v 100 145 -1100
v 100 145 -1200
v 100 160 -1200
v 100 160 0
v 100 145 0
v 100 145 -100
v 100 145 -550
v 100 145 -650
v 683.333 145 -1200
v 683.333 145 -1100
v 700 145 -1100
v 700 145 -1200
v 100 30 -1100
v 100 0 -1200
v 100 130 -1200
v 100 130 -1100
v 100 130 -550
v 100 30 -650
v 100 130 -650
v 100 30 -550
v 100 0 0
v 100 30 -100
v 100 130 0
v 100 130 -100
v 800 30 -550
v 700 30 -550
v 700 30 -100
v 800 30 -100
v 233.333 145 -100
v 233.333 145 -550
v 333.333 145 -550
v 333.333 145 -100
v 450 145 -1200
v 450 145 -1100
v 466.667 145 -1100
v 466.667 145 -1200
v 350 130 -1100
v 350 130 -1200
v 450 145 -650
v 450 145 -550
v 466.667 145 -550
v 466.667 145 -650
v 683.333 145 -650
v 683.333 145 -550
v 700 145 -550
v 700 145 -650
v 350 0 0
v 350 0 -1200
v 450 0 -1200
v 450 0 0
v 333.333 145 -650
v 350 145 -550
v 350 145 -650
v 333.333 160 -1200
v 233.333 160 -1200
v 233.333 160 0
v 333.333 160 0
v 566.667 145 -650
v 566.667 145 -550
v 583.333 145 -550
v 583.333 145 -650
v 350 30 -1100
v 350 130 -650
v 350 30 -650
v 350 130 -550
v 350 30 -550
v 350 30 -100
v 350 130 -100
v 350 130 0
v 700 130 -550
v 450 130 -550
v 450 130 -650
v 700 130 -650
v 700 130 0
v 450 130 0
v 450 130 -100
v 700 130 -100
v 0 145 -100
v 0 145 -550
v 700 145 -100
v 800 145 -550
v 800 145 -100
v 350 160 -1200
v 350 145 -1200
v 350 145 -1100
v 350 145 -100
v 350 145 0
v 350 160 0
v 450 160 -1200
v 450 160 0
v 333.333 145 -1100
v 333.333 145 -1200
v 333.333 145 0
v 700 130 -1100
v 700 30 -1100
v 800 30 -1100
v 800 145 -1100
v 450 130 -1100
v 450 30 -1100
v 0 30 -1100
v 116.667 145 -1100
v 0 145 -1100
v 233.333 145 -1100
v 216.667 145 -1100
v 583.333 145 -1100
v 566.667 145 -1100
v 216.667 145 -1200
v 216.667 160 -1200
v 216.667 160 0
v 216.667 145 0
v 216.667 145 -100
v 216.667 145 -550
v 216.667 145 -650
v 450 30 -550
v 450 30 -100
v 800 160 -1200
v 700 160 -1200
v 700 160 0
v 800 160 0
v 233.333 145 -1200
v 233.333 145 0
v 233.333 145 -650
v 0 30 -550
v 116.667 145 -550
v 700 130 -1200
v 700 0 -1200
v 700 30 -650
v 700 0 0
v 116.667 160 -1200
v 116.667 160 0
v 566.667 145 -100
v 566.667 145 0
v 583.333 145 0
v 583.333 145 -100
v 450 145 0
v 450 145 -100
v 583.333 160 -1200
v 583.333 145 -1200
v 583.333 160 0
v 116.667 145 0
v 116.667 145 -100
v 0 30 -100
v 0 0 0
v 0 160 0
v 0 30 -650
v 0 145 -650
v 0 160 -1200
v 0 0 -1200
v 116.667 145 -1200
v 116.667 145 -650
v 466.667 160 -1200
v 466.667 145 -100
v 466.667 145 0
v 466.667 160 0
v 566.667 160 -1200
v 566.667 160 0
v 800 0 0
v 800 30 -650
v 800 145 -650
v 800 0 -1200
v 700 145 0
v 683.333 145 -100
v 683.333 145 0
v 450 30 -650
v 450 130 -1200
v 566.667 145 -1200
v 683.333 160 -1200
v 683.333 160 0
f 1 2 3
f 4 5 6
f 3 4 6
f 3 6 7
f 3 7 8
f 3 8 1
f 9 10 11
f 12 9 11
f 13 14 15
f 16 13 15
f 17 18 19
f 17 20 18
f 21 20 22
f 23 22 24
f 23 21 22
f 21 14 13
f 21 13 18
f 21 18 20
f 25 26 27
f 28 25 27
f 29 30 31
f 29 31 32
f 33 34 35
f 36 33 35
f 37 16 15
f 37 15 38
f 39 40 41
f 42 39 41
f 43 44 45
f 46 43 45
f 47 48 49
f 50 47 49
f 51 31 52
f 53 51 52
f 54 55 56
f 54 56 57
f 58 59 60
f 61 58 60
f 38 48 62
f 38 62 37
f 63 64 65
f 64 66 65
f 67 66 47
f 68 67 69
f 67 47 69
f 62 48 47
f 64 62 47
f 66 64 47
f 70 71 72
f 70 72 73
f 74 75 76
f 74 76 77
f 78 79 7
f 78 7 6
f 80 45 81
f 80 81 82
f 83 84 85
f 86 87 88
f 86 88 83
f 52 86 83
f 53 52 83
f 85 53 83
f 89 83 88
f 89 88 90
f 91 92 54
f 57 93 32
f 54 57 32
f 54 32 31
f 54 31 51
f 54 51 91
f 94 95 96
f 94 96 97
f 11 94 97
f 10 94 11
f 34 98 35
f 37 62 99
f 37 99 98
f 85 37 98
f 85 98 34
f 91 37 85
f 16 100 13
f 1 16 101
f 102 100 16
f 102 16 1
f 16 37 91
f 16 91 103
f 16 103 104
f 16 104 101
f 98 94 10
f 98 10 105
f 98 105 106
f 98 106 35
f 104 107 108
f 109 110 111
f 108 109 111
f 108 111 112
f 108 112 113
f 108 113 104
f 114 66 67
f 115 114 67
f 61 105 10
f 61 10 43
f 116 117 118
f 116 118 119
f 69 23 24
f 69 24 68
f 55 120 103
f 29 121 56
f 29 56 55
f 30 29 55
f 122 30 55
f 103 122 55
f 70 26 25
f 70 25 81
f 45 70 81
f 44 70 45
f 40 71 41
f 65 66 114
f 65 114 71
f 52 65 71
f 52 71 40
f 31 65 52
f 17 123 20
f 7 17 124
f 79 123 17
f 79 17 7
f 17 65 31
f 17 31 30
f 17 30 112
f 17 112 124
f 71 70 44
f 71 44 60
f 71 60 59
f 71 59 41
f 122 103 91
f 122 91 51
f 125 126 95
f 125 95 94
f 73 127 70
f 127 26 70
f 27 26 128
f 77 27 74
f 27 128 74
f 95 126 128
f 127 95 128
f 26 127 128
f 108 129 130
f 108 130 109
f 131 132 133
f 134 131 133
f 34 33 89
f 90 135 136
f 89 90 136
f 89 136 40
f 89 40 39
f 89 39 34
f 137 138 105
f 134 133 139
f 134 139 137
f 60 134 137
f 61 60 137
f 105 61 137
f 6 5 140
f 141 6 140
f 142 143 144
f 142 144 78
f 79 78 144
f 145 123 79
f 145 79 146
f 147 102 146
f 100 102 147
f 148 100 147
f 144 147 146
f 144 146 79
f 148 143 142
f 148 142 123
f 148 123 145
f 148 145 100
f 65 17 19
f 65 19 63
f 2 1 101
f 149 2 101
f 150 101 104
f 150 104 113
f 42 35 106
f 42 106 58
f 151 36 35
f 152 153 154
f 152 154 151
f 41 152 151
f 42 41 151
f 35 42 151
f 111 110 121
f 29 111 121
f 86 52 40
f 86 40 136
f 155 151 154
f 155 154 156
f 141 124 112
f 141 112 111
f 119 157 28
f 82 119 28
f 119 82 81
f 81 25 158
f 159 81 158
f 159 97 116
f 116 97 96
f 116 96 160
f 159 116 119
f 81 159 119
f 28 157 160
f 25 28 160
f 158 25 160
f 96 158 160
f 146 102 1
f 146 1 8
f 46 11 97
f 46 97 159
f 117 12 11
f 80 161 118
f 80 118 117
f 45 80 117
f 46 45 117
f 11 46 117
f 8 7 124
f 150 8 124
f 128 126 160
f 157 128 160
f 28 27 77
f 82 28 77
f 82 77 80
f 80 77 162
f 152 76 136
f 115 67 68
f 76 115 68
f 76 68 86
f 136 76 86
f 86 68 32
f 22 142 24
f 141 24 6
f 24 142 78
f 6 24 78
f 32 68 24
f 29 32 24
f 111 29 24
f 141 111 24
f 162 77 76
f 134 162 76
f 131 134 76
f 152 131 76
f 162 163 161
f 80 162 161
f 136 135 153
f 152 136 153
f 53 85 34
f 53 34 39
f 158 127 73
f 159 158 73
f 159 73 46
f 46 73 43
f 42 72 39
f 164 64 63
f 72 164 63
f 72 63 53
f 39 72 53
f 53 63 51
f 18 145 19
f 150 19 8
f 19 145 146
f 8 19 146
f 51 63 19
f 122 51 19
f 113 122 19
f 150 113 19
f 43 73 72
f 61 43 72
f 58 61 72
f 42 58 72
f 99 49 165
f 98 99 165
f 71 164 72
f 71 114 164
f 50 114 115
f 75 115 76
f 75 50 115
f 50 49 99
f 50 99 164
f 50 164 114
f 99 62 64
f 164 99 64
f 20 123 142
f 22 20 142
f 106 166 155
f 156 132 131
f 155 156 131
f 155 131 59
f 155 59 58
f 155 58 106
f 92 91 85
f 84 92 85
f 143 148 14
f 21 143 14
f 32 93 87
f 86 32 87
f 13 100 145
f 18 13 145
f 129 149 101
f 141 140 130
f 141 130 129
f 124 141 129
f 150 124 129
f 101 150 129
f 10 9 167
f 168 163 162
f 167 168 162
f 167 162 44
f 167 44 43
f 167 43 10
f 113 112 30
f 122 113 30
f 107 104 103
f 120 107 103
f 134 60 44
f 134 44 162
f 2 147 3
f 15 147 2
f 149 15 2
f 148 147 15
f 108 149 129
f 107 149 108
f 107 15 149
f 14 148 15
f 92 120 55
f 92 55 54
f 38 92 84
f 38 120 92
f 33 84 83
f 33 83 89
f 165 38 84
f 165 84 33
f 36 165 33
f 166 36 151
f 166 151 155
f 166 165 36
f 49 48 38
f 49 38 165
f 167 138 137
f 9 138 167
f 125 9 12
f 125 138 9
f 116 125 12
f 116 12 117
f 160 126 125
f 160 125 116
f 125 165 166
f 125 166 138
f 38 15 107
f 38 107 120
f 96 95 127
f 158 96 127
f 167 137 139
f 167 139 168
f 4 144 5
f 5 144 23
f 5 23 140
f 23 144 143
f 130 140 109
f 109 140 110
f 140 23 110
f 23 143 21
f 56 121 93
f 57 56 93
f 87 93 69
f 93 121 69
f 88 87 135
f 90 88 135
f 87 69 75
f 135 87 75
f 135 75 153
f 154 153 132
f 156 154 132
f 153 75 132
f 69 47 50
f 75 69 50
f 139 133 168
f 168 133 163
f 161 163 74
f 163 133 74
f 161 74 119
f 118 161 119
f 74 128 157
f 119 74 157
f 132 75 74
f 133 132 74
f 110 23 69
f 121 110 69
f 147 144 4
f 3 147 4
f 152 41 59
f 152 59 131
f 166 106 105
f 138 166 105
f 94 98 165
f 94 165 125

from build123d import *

# Parameters (mm, degrees)
SKETCH1_W           = 800
SKETCH1_H           = 1200
BOSS_EXTRUDE1_DEPTH = 160
SKETCH2_W           = 250
SKETCH2_H           = 130
CUT_EXTRUDE1_DEPTH  = 1452.068571777
SKETCH3_W           = 450
SKETCH3_H           = 115
CUT_EXTRUDE2_DEPTH  = 1452.068571777
SKETCH4_W           = 16.666666667
SKETCH4_H           = 15
SKETCH4_W_2         = 16.666666666
CUT_EXTRUDE3_DEPTH  = 1452.068571777


with BuildPart() as part:
    # Sketch1 → Boss-Extrude1 (new body)
    with BuildSketch(Plane(origin=(0, 0, 0), x_dir=(1, 0, 0), z_dir=(0, 1, 0))):
        with Locations((400, 600)):
            Rectangle(SKETCH1_W, SKETCH1_H)
    extrude(amount=BOSS_EXTRUDE1_DEPTH)

    # Sketch2 → Cut-Extrude1 (cut, through all)
    with BuildSketch(Plane.XY):
        with Locations((225, 65)):
            Rectangle(SKETCH2_W, SKETCH2_H)
        with Locations((575, 65)):
            Rectangle(SKETCH2_W, SKETCH2_H)
    extrude(amount=-CUT_EXTRUDE1_DEPTH, mode=Mode.SUBTRACT)

    # Sketch3 → Cut-Extrude2 (cut, through all)
    with BuildSketch(Plane.ZY):
        with Locations((-875, 87.5)):
            Rectangle(SKETCH3_W, SKETCH3_H)
        with Locations((-325, 87.5)):
            Rectangle(SKETCH3_W, SKETCH3_H)
    extrude(amount=-CUT_EXTRUDE2_DEPTH, mode=Mode.SUBTRACT)

    # Sketch4 → Cut-Extrude3 (cut, through all)
    with BuildSketch(Plane.XY):
        with Locations((108.333333334, 152.5)):
            Rectangle(SKETCH4_W, SKETCH4_H)
        with Locations((225, 152.5)):
            Rectangle(SKETCH4_W_2, SKETCH4_H)
        with Locations((341.666666667, 152.5)):
            Rectangle(SKETCH4_W, SKETCH4_H)
        with Locations((458.333333334, 152.5)):
            Rectangle(SKETCH4_W, SKETCH4_H)
        with Locations((575, 152.5)):
            Rectangle(SKETCH4_W_2, SKETCH4_H)
        with Locations((691.666666667, 152.5)):
            Rectangle(SKETCH4_W, SKETCH4_H)
    extrude(amount=-CUT_EXTRUDE3_DEPTH, mode=Mode.SUBTRACT)


solid = part.part
